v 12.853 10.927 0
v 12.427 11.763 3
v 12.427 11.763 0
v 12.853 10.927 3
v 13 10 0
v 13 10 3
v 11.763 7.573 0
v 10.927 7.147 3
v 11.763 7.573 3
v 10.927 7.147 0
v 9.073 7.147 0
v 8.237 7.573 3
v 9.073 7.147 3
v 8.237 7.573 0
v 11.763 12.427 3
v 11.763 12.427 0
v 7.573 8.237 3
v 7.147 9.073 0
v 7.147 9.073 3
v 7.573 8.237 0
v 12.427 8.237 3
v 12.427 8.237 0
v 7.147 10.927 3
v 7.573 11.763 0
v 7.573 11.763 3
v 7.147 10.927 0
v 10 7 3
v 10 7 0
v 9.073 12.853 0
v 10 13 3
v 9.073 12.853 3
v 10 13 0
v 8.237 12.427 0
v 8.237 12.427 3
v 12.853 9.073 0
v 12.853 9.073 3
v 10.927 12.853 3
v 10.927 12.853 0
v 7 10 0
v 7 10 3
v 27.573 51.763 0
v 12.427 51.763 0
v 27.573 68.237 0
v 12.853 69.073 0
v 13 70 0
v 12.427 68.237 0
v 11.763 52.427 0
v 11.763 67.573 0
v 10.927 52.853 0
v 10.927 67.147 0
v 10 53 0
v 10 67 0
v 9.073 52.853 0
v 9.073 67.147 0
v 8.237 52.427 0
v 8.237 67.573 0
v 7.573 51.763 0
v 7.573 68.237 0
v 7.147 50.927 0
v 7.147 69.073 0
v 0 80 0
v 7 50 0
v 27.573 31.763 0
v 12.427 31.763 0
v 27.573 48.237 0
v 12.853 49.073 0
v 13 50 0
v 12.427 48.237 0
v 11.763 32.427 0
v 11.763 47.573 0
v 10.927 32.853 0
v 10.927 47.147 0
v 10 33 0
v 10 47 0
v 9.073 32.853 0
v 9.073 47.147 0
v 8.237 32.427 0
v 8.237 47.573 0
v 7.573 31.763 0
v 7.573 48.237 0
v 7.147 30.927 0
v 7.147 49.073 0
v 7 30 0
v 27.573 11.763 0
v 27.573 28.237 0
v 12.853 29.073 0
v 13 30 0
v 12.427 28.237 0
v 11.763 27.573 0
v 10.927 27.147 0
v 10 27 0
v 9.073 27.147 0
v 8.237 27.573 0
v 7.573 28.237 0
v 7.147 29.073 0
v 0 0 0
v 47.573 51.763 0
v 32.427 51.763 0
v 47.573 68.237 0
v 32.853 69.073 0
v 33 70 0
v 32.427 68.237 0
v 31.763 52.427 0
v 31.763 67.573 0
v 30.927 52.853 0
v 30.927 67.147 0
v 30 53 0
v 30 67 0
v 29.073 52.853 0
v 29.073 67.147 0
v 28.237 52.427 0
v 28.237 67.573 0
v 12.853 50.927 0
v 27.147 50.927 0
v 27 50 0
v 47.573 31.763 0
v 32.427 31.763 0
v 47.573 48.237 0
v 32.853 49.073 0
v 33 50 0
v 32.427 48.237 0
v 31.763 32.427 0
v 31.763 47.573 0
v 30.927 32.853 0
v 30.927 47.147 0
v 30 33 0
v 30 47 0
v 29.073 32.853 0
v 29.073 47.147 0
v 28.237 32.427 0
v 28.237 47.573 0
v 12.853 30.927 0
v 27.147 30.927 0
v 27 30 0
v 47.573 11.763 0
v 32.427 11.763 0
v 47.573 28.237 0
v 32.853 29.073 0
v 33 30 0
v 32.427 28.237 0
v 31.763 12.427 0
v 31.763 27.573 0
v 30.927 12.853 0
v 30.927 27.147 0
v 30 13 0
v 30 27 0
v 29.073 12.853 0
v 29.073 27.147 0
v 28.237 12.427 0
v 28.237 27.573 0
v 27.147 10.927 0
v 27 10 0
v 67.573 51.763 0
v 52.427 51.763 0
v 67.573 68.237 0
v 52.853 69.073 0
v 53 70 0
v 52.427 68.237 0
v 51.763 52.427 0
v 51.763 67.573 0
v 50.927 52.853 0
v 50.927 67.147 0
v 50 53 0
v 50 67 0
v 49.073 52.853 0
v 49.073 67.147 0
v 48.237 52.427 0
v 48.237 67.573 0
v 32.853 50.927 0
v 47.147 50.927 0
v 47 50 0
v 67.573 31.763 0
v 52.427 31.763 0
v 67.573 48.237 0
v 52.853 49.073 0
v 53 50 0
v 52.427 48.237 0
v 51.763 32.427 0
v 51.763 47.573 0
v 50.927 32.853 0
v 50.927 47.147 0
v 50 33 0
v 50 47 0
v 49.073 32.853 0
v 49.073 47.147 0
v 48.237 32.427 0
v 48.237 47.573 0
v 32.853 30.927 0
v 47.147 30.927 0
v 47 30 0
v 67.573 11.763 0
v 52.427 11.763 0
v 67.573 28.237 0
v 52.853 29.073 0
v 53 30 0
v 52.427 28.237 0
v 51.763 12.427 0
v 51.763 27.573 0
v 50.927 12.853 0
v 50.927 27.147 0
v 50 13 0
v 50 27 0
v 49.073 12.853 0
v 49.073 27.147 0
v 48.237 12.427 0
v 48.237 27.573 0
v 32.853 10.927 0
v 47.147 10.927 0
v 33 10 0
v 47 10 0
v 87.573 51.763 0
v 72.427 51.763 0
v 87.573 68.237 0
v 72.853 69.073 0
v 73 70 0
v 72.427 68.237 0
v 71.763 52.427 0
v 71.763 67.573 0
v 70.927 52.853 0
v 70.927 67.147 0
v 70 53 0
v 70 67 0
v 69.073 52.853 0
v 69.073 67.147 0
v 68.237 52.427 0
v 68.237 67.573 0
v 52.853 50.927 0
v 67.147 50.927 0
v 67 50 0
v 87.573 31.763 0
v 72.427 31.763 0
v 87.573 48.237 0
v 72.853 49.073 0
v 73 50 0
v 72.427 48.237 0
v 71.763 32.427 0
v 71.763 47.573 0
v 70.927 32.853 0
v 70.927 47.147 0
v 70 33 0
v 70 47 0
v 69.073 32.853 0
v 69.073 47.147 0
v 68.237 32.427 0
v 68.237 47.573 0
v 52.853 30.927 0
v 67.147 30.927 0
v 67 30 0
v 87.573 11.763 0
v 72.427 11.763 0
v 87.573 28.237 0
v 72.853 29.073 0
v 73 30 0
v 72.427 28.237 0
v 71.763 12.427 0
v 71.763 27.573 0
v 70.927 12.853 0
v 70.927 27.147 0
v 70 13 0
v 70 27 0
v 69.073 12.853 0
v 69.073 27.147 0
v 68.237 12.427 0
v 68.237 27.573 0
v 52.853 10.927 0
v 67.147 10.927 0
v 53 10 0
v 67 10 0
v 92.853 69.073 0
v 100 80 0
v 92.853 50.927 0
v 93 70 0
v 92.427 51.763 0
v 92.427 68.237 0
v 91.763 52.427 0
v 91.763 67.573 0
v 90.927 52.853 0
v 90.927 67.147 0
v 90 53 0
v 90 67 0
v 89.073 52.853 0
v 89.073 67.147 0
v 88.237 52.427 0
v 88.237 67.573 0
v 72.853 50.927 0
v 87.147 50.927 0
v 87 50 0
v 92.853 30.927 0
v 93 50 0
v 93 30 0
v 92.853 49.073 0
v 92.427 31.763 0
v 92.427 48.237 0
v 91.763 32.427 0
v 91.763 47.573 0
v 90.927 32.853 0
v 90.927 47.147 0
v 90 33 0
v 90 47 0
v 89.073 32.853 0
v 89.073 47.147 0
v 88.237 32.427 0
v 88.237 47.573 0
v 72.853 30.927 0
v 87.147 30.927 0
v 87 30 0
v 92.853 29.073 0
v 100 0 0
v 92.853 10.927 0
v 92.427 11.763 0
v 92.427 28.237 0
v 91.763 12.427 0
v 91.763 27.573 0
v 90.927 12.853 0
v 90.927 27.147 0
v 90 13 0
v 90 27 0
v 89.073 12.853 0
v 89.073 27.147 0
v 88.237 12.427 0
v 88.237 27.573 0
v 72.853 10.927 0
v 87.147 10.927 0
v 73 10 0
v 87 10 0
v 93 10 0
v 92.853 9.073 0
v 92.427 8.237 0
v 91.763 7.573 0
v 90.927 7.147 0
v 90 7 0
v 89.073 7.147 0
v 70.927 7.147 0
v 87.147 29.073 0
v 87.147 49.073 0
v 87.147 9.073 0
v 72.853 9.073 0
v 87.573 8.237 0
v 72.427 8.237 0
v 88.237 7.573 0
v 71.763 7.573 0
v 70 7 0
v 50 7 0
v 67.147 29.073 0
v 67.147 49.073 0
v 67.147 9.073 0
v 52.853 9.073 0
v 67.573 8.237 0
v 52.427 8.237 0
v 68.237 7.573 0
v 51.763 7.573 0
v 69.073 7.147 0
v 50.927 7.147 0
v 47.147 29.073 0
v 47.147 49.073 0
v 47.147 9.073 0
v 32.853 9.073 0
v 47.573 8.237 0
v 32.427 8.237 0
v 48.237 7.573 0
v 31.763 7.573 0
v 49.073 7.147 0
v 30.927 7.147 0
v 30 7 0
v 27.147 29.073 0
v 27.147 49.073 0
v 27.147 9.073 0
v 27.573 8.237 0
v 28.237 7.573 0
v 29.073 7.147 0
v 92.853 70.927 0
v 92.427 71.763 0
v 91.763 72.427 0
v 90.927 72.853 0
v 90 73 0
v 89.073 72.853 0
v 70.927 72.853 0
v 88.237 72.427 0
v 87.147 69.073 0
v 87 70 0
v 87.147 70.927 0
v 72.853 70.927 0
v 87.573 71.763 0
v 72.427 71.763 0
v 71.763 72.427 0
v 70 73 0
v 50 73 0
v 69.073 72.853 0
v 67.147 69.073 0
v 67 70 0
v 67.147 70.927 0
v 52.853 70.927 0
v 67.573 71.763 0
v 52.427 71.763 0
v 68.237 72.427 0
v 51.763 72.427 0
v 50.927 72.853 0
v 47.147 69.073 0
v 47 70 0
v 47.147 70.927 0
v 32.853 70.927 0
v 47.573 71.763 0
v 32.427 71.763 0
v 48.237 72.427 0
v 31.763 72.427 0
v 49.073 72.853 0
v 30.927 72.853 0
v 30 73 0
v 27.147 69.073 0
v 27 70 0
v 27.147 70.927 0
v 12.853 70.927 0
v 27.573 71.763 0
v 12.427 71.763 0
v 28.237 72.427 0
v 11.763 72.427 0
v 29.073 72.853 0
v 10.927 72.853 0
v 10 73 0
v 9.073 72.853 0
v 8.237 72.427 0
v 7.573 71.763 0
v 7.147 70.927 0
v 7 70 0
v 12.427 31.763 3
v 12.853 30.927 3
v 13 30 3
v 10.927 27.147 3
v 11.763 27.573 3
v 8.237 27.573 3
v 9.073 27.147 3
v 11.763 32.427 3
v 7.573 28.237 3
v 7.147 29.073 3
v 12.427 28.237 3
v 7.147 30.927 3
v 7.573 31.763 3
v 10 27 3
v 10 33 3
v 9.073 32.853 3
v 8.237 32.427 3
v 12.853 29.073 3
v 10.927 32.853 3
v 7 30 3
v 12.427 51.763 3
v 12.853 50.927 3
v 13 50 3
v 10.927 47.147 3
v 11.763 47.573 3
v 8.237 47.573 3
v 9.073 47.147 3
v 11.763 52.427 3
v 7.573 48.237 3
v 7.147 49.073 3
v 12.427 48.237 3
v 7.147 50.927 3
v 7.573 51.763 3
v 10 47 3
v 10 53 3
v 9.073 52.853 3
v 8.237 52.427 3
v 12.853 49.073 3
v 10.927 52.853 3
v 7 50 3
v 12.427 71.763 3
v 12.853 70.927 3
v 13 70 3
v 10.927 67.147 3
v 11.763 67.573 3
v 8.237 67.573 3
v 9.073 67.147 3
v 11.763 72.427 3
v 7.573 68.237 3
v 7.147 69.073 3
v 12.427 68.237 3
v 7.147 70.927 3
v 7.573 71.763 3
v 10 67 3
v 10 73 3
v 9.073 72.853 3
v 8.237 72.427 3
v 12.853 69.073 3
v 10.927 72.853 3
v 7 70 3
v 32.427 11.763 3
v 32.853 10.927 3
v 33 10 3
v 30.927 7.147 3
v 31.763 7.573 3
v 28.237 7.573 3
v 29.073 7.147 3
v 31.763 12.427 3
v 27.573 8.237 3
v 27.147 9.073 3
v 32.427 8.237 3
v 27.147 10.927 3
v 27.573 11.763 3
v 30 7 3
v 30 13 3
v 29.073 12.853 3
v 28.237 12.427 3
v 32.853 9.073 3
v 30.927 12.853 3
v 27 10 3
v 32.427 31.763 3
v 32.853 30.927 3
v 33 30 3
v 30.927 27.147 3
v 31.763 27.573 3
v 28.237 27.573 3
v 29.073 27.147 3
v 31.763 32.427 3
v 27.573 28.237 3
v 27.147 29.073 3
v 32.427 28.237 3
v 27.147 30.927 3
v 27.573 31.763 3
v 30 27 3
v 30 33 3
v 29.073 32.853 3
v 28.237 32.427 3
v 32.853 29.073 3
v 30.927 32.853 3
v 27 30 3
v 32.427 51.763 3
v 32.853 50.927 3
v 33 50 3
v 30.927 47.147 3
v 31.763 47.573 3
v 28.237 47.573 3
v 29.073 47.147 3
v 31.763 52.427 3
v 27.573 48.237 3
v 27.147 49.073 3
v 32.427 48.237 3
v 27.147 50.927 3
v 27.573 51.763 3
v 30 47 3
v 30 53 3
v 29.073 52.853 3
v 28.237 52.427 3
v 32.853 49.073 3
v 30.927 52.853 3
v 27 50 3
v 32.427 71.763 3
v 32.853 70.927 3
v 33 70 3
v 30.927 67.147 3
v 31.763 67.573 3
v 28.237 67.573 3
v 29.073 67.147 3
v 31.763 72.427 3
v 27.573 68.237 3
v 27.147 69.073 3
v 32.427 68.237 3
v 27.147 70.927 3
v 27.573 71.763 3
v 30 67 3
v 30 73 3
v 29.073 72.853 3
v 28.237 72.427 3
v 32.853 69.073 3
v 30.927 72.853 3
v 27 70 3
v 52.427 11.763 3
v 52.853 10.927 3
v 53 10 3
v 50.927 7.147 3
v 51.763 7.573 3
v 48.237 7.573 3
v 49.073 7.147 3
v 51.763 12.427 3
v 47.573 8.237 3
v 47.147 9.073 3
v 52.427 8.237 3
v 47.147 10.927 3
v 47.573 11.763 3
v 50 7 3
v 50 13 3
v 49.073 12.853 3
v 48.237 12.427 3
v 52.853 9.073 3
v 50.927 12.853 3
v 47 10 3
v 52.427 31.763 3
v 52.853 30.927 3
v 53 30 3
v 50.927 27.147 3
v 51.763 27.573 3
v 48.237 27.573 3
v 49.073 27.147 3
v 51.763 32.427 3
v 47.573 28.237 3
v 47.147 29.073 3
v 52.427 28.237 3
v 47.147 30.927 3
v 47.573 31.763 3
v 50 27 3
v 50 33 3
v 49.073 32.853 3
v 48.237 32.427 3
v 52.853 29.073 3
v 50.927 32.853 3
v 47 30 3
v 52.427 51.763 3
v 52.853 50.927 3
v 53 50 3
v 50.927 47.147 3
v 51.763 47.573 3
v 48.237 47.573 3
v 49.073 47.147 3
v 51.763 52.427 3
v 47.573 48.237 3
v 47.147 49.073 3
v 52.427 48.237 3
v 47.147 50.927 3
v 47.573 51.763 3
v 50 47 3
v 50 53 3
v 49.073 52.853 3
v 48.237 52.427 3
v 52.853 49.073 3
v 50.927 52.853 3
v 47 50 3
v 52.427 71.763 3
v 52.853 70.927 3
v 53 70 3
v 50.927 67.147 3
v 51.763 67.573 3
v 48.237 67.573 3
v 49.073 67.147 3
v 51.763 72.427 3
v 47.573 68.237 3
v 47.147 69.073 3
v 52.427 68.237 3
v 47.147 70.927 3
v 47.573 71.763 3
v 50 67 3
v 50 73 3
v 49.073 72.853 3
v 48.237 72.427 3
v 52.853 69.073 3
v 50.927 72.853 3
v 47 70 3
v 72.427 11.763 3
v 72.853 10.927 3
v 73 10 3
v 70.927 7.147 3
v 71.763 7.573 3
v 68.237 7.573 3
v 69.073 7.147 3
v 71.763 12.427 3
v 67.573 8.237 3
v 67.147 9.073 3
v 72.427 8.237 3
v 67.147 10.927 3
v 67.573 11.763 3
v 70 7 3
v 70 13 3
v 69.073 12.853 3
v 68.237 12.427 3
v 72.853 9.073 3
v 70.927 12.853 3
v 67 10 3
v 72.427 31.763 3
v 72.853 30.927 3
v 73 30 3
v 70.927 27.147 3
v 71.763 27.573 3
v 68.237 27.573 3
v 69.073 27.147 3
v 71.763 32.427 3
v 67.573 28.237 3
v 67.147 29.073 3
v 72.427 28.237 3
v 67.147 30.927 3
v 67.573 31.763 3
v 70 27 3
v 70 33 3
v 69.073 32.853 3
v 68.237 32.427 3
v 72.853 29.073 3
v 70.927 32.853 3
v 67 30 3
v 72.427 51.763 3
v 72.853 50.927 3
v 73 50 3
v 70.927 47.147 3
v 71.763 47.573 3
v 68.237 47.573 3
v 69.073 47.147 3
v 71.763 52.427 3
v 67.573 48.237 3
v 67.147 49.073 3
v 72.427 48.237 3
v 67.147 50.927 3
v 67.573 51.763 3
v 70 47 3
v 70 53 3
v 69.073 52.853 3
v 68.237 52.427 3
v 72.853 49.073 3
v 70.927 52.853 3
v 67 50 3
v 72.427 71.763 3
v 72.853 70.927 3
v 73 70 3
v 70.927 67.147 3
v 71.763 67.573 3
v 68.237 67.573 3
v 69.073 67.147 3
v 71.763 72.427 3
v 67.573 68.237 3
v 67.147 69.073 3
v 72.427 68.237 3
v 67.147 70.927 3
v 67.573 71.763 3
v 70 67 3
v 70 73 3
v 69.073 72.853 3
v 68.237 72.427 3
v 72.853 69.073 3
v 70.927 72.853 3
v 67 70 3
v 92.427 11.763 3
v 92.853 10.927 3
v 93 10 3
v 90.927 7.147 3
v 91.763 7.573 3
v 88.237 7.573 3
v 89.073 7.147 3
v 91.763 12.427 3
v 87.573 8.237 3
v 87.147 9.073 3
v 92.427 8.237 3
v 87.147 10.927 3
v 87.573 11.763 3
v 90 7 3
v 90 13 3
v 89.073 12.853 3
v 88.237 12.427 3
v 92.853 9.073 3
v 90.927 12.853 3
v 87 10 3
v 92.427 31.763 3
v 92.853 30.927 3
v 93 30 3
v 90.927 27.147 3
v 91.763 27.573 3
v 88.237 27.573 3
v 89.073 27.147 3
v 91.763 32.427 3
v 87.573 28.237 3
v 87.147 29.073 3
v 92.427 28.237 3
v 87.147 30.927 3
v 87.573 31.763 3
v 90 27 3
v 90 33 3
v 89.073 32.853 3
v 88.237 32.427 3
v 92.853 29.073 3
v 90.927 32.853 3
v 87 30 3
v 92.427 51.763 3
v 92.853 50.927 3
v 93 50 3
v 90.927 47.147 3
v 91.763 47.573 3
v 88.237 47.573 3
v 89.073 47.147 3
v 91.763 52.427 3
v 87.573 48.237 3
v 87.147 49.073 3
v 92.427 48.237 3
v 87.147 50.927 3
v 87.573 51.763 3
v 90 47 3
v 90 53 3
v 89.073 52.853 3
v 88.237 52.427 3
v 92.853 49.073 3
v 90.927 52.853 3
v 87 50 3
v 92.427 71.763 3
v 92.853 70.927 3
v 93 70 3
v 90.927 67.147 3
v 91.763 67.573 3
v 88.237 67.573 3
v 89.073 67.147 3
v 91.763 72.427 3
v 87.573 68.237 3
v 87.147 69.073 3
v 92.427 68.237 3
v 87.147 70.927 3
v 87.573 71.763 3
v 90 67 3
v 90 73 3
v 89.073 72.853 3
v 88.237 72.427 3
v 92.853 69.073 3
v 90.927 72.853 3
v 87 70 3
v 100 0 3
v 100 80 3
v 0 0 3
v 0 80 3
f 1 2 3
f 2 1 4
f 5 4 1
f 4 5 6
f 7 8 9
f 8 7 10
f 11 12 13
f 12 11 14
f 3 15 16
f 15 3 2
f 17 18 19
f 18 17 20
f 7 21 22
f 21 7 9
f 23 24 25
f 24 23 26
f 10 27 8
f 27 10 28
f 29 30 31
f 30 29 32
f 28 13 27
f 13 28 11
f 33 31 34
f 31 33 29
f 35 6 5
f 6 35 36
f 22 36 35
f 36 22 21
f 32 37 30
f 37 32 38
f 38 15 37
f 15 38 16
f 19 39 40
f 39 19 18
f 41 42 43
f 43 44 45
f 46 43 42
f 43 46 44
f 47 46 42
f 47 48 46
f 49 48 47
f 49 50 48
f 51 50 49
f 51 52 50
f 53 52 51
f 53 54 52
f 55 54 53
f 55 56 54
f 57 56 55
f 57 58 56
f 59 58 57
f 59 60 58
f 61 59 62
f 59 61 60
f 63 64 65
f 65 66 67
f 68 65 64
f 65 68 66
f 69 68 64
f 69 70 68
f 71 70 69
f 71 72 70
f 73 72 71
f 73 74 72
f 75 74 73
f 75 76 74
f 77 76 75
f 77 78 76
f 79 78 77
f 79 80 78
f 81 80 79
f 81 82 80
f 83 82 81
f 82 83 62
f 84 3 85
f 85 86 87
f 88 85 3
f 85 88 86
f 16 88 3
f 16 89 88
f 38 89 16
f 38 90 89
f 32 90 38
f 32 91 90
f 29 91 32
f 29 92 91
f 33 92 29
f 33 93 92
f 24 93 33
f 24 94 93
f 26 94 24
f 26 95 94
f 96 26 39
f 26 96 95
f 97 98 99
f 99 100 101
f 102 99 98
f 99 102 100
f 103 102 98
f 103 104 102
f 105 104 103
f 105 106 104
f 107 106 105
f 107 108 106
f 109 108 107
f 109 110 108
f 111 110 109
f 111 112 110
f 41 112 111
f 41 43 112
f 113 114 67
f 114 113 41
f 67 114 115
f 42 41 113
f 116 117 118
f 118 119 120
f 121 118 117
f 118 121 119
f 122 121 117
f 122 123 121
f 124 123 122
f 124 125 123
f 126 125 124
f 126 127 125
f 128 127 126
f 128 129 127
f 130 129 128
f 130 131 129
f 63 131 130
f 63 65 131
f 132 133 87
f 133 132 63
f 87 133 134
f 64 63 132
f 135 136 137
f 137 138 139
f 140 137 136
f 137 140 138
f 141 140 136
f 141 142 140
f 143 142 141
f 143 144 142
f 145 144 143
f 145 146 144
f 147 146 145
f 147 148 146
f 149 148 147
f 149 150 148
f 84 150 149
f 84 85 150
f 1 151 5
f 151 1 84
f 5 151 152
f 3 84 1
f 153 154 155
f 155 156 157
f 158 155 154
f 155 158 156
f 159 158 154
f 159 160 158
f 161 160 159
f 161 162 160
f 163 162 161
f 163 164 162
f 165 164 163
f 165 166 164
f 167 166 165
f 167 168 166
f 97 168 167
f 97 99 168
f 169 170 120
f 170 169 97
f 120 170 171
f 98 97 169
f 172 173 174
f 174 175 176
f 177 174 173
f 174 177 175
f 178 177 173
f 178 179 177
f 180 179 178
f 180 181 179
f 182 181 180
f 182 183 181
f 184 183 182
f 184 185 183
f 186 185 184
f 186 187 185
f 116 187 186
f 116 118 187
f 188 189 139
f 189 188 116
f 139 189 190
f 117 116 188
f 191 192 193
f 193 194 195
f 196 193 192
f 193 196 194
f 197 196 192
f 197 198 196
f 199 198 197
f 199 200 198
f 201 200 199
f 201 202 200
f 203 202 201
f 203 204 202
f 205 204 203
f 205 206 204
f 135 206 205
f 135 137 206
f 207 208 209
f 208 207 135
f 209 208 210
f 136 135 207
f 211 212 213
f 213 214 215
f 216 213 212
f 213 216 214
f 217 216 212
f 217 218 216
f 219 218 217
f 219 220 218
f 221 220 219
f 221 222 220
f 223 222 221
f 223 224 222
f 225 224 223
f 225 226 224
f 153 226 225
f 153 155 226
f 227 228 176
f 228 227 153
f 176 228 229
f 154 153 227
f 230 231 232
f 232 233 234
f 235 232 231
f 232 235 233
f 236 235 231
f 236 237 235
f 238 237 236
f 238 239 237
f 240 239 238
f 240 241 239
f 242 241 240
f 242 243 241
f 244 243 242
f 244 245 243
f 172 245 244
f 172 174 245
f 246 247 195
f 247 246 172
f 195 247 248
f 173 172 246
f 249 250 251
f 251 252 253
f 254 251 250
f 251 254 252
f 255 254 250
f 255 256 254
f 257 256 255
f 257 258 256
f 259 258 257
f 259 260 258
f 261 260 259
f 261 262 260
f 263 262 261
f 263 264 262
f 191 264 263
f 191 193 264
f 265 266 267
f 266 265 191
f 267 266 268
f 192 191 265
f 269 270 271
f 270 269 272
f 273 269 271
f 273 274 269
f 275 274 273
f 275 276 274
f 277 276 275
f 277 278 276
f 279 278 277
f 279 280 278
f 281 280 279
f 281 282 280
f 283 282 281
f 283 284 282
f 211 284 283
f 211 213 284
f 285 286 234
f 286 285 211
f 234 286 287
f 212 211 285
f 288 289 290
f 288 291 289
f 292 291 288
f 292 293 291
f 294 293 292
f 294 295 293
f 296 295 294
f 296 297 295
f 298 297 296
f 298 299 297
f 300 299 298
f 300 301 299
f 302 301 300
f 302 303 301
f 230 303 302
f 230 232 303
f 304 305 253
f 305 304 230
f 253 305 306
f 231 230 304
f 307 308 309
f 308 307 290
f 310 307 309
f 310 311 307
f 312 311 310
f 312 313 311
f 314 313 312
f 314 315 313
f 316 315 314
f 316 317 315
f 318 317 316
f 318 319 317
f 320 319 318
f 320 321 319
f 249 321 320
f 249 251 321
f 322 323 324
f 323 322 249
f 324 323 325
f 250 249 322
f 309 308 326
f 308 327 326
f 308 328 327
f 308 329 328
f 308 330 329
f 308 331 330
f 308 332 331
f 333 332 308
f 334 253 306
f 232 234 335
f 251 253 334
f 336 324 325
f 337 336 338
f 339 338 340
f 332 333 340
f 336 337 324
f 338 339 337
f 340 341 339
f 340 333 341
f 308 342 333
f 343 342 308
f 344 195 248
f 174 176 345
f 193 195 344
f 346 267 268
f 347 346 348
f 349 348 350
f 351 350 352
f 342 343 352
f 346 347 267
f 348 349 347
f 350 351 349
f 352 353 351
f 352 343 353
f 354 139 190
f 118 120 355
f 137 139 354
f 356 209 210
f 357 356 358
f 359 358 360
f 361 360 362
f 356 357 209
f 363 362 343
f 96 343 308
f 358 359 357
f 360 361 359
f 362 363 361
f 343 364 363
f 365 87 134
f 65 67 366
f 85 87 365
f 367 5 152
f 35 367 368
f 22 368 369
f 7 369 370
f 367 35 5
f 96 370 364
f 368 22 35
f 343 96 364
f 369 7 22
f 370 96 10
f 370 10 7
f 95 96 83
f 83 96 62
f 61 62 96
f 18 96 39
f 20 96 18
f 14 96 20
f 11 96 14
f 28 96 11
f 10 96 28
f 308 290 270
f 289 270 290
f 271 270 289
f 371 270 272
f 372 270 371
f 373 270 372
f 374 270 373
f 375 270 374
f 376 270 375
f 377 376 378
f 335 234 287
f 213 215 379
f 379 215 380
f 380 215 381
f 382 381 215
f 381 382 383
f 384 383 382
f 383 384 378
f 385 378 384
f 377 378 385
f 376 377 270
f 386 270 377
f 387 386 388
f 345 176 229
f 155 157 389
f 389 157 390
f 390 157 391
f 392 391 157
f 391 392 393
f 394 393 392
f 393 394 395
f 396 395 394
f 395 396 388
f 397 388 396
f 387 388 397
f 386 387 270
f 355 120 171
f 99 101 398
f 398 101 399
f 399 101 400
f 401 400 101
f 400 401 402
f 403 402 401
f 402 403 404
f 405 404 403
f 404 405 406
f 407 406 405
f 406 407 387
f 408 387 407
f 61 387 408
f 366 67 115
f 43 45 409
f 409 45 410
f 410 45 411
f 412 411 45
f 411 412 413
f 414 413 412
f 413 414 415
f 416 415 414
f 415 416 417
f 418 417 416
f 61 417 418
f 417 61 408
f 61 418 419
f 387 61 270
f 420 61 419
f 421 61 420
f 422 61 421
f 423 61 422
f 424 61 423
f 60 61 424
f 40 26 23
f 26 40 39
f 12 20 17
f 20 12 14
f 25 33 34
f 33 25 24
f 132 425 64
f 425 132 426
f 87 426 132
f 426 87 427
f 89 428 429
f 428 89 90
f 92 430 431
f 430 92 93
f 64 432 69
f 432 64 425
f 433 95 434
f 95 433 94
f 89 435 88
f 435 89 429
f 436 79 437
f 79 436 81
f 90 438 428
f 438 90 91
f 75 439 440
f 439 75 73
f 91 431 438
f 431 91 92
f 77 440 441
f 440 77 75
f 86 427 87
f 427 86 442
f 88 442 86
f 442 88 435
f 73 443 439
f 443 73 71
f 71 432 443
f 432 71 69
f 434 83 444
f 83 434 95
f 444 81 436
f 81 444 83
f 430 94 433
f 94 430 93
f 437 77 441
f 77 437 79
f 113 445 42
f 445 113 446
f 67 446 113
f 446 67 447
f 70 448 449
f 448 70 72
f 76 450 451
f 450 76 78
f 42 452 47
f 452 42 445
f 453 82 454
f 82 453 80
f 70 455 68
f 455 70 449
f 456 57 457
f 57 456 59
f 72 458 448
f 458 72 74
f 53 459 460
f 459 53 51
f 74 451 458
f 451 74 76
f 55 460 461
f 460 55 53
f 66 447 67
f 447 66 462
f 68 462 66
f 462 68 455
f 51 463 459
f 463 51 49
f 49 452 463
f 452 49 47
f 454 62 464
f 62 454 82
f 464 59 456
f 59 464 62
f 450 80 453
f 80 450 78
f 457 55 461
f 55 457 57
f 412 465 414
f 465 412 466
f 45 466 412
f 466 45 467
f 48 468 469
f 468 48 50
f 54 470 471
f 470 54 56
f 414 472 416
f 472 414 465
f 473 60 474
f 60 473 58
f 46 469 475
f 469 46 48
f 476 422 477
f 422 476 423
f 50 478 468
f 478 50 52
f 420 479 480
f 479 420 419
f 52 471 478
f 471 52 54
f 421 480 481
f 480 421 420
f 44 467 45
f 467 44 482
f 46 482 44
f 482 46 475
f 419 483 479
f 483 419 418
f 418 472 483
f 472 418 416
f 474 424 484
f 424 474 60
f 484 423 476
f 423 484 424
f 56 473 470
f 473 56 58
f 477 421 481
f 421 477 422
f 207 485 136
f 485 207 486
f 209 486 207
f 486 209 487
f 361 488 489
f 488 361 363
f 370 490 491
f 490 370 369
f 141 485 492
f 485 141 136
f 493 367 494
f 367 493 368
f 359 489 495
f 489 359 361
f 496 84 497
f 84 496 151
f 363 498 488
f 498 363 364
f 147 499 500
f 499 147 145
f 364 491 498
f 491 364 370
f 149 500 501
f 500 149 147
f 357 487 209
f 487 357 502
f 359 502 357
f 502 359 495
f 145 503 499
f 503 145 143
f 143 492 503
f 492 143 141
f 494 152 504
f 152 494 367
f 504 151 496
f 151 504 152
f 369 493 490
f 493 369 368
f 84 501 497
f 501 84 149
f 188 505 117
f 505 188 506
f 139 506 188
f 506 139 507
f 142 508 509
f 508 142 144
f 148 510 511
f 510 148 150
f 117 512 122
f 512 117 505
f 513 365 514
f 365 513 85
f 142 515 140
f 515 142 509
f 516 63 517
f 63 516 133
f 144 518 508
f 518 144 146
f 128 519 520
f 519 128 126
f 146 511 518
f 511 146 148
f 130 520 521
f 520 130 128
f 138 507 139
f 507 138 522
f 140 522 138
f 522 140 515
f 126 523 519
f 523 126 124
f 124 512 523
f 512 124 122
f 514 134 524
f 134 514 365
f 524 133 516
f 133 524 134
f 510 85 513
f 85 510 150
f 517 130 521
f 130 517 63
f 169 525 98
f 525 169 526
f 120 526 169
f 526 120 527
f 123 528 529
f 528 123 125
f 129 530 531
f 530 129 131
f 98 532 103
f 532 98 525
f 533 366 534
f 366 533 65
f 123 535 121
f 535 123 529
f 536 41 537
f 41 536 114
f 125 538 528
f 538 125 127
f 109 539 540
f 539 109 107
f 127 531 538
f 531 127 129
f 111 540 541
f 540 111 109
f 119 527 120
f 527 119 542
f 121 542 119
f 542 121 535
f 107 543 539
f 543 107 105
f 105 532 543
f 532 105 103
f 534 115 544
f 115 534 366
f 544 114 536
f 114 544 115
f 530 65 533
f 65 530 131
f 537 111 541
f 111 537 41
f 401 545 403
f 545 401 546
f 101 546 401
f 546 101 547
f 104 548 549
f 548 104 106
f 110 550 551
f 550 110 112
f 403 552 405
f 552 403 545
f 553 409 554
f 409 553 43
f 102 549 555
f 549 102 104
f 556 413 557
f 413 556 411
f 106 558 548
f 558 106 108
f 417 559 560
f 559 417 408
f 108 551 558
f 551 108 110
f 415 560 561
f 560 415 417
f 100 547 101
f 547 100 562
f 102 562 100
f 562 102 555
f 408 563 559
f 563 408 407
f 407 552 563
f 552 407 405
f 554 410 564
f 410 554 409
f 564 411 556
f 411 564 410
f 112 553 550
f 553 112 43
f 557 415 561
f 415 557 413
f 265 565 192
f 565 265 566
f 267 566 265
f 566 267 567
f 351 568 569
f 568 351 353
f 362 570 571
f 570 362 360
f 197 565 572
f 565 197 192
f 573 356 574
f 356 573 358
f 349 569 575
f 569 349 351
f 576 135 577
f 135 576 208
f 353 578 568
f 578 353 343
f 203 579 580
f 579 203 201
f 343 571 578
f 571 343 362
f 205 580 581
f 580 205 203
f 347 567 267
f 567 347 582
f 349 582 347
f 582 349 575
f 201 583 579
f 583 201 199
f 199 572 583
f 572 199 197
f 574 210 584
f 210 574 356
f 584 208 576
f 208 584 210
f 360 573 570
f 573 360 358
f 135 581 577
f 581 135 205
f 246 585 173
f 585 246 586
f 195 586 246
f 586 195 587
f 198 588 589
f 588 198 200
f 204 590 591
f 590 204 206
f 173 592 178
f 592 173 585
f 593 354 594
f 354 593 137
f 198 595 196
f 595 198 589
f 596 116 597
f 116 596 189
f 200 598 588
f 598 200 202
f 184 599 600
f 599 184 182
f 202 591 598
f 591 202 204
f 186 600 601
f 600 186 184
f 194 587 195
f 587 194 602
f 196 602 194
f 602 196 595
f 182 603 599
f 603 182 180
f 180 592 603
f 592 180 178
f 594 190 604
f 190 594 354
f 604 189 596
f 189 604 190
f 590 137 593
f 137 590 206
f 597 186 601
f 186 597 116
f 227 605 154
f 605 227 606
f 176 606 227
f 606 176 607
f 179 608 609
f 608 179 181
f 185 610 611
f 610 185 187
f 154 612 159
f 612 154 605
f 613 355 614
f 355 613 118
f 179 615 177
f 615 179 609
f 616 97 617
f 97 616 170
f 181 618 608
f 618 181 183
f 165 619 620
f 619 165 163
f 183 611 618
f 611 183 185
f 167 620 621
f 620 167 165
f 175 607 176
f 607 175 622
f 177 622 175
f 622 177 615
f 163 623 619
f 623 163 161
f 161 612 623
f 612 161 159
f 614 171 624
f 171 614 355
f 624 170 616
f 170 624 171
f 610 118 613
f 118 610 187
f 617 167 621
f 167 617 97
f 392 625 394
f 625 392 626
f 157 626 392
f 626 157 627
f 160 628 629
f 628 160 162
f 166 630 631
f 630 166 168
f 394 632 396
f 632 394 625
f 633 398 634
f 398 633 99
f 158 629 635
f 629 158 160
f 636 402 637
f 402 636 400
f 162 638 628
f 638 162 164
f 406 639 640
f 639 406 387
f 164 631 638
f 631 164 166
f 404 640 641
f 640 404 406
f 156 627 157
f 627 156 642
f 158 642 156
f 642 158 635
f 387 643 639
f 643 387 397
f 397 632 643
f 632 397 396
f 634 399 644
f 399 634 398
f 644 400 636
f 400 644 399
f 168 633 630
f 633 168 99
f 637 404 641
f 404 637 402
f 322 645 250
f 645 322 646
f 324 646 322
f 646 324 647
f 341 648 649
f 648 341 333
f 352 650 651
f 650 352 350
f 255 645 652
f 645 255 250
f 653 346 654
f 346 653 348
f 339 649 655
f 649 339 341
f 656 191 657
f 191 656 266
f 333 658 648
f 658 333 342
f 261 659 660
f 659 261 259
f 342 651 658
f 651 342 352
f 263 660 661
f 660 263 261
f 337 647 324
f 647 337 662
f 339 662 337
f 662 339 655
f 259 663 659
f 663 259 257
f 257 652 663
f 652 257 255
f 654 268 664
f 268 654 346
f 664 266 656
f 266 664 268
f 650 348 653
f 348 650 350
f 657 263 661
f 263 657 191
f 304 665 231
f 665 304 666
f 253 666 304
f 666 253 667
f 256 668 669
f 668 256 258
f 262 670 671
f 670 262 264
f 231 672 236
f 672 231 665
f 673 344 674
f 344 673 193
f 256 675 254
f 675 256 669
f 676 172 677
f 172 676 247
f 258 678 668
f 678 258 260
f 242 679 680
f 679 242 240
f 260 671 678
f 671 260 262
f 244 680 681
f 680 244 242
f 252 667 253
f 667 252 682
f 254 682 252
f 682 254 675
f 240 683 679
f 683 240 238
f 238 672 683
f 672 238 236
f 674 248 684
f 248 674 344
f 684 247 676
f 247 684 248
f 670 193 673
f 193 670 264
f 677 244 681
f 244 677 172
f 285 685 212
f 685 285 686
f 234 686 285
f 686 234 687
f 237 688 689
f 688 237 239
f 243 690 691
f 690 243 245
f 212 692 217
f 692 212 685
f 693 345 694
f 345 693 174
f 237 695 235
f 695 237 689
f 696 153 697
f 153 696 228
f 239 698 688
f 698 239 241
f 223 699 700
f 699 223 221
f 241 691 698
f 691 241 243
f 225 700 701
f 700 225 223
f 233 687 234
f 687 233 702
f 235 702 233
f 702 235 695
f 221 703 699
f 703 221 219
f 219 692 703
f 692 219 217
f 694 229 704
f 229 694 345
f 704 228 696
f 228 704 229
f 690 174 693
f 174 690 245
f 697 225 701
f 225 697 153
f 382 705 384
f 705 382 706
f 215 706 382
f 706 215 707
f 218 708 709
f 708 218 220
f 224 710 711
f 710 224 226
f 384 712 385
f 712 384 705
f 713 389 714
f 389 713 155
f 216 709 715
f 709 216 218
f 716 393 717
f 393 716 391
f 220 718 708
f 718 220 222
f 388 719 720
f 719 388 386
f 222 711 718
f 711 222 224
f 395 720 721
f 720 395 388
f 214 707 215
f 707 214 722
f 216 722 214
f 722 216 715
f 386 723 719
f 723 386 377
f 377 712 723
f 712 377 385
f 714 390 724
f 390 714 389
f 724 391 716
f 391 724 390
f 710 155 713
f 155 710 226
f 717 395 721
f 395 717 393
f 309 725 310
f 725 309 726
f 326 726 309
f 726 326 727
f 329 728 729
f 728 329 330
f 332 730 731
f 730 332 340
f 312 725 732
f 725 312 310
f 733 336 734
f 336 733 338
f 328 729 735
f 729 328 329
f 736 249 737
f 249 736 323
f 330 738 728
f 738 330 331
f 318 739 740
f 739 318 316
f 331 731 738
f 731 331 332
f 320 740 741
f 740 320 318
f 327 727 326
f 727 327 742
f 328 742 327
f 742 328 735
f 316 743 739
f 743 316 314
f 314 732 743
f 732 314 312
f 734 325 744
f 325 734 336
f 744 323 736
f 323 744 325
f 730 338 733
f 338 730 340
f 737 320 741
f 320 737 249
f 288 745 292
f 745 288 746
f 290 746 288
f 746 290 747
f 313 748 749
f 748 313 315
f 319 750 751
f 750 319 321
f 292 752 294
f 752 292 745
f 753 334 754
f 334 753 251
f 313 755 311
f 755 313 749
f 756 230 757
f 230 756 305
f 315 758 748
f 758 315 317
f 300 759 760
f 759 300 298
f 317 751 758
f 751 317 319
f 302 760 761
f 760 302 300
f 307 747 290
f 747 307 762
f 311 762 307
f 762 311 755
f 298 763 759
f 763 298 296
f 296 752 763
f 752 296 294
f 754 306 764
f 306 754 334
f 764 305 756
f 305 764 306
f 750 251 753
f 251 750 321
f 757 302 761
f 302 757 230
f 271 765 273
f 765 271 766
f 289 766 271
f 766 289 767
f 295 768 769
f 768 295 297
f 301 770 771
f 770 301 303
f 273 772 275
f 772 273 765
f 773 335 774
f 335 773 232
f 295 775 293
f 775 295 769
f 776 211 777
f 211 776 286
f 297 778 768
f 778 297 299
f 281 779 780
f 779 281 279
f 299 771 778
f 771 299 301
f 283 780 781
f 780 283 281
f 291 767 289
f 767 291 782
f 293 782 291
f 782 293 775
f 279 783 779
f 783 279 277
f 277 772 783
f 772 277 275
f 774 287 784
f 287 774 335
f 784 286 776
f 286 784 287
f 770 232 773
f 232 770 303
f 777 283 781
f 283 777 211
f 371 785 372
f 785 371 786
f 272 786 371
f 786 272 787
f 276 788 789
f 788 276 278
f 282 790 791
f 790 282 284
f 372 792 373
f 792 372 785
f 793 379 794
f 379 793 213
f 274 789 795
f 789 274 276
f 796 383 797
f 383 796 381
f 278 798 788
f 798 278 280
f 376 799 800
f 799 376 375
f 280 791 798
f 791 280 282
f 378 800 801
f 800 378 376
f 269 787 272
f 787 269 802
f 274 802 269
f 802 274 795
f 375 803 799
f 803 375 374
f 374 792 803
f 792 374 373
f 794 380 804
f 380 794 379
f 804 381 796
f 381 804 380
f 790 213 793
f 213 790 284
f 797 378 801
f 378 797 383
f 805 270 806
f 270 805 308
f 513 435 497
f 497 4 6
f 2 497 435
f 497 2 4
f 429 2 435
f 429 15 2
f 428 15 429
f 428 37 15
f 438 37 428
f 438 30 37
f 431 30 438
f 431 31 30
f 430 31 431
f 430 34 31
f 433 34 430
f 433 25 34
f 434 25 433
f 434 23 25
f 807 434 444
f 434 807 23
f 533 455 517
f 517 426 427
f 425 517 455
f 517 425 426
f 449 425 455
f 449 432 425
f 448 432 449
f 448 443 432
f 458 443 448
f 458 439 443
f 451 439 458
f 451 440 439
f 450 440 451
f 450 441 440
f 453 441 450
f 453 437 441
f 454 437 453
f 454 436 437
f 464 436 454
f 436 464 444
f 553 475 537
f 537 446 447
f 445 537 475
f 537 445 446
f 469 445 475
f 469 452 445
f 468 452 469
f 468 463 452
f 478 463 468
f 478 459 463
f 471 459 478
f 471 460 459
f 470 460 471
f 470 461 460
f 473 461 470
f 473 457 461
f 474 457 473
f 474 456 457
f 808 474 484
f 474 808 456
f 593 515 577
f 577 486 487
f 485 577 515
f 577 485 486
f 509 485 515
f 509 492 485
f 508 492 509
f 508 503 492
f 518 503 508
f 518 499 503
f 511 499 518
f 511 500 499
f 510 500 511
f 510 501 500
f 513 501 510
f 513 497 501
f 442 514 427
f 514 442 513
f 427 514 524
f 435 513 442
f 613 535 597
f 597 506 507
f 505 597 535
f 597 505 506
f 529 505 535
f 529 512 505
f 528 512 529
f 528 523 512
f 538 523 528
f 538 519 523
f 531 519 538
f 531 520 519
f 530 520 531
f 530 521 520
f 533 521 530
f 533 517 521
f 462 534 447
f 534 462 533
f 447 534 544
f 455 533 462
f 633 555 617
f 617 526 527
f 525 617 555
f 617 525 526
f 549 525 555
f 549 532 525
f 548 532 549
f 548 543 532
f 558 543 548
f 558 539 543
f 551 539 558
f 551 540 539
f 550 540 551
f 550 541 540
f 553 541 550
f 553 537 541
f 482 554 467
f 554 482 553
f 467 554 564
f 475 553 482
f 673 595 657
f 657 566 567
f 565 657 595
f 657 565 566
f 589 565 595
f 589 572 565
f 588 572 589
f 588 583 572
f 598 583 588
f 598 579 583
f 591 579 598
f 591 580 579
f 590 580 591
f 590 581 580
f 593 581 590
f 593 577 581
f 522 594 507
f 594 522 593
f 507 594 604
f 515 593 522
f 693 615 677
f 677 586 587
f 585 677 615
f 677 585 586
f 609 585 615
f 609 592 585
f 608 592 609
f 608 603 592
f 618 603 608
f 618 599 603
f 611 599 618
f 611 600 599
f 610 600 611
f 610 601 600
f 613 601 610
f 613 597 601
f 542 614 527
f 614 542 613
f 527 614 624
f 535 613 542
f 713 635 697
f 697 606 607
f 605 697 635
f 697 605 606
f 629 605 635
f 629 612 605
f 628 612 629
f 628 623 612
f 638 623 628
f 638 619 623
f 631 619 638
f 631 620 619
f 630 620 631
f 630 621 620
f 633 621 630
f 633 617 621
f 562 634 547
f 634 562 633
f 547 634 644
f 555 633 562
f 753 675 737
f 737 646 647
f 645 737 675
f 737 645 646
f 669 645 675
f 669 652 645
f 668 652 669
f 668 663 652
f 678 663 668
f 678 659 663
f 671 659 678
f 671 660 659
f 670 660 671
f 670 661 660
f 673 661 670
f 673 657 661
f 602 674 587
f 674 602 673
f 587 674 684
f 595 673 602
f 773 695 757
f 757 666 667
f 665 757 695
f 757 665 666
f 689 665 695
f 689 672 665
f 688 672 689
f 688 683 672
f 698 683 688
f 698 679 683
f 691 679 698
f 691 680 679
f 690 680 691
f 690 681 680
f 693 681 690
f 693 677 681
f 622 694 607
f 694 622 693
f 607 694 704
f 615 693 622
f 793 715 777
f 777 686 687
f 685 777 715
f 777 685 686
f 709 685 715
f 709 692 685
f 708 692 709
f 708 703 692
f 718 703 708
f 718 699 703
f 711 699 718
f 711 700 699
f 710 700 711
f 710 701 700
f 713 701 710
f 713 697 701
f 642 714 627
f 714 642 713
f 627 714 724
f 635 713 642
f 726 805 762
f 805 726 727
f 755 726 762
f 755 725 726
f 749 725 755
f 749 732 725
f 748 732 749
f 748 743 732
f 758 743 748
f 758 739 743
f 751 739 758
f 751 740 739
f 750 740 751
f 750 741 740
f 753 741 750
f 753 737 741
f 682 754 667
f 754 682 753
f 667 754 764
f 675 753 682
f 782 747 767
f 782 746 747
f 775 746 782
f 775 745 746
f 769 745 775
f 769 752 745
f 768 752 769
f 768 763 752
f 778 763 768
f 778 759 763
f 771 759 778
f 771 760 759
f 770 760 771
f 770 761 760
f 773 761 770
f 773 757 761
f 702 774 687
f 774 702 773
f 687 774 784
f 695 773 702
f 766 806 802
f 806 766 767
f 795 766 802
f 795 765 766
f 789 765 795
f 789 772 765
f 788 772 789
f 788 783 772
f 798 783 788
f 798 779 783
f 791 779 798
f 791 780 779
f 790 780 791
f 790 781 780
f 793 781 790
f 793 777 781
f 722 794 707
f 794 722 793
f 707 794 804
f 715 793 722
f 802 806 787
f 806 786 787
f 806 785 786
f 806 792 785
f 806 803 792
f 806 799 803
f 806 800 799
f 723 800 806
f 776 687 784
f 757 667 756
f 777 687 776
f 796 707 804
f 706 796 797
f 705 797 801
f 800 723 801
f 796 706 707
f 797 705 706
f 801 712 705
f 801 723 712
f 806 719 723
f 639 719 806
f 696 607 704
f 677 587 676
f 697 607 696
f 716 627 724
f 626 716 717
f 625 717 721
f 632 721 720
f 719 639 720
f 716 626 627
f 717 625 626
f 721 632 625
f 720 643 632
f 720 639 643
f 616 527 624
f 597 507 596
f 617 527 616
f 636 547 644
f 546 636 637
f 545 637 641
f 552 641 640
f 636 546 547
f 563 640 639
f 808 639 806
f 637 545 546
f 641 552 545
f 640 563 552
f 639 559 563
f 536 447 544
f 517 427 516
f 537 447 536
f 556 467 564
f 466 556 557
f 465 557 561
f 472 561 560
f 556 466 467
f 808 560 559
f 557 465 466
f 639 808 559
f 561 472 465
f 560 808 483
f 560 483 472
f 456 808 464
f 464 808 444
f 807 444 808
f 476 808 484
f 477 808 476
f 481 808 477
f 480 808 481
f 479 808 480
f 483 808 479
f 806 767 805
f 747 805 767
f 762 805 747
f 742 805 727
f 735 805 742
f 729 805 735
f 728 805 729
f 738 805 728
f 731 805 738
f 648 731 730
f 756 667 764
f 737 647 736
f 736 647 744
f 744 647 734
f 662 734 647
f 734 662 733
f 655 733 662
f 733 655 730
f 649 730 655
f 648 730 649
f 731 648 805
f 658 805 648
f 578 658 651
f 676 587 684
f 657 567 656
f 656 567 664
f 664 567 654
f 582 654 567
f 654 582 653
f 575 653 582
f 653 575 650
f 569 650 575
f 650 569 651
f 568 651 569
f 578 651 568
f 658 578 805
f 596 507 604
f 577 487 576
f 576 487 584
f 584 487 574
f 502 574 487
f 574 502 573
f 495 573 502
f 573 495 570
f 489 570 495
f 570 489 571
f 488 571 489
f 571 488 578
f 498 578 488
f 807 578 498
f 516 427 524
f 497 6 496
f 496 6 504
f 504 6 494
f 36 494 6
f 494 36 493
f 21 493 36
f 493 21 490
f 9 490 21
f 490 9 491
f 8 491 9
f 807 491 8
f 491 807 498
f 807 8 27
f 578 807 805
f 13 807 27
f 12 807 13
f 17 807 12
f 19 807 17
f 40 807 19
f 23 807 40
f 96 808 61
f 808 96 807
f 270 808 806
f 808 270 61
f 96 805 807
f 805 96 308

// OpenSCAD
difference(){
    cube([100,80,3]);
    
    for (i =[10: 20 :100 ], j = [10: 20 :80 ]){ 
        translate([i, j, 0])
            cylinder (h = 20, d=6, $fn=20);
}
    
}
